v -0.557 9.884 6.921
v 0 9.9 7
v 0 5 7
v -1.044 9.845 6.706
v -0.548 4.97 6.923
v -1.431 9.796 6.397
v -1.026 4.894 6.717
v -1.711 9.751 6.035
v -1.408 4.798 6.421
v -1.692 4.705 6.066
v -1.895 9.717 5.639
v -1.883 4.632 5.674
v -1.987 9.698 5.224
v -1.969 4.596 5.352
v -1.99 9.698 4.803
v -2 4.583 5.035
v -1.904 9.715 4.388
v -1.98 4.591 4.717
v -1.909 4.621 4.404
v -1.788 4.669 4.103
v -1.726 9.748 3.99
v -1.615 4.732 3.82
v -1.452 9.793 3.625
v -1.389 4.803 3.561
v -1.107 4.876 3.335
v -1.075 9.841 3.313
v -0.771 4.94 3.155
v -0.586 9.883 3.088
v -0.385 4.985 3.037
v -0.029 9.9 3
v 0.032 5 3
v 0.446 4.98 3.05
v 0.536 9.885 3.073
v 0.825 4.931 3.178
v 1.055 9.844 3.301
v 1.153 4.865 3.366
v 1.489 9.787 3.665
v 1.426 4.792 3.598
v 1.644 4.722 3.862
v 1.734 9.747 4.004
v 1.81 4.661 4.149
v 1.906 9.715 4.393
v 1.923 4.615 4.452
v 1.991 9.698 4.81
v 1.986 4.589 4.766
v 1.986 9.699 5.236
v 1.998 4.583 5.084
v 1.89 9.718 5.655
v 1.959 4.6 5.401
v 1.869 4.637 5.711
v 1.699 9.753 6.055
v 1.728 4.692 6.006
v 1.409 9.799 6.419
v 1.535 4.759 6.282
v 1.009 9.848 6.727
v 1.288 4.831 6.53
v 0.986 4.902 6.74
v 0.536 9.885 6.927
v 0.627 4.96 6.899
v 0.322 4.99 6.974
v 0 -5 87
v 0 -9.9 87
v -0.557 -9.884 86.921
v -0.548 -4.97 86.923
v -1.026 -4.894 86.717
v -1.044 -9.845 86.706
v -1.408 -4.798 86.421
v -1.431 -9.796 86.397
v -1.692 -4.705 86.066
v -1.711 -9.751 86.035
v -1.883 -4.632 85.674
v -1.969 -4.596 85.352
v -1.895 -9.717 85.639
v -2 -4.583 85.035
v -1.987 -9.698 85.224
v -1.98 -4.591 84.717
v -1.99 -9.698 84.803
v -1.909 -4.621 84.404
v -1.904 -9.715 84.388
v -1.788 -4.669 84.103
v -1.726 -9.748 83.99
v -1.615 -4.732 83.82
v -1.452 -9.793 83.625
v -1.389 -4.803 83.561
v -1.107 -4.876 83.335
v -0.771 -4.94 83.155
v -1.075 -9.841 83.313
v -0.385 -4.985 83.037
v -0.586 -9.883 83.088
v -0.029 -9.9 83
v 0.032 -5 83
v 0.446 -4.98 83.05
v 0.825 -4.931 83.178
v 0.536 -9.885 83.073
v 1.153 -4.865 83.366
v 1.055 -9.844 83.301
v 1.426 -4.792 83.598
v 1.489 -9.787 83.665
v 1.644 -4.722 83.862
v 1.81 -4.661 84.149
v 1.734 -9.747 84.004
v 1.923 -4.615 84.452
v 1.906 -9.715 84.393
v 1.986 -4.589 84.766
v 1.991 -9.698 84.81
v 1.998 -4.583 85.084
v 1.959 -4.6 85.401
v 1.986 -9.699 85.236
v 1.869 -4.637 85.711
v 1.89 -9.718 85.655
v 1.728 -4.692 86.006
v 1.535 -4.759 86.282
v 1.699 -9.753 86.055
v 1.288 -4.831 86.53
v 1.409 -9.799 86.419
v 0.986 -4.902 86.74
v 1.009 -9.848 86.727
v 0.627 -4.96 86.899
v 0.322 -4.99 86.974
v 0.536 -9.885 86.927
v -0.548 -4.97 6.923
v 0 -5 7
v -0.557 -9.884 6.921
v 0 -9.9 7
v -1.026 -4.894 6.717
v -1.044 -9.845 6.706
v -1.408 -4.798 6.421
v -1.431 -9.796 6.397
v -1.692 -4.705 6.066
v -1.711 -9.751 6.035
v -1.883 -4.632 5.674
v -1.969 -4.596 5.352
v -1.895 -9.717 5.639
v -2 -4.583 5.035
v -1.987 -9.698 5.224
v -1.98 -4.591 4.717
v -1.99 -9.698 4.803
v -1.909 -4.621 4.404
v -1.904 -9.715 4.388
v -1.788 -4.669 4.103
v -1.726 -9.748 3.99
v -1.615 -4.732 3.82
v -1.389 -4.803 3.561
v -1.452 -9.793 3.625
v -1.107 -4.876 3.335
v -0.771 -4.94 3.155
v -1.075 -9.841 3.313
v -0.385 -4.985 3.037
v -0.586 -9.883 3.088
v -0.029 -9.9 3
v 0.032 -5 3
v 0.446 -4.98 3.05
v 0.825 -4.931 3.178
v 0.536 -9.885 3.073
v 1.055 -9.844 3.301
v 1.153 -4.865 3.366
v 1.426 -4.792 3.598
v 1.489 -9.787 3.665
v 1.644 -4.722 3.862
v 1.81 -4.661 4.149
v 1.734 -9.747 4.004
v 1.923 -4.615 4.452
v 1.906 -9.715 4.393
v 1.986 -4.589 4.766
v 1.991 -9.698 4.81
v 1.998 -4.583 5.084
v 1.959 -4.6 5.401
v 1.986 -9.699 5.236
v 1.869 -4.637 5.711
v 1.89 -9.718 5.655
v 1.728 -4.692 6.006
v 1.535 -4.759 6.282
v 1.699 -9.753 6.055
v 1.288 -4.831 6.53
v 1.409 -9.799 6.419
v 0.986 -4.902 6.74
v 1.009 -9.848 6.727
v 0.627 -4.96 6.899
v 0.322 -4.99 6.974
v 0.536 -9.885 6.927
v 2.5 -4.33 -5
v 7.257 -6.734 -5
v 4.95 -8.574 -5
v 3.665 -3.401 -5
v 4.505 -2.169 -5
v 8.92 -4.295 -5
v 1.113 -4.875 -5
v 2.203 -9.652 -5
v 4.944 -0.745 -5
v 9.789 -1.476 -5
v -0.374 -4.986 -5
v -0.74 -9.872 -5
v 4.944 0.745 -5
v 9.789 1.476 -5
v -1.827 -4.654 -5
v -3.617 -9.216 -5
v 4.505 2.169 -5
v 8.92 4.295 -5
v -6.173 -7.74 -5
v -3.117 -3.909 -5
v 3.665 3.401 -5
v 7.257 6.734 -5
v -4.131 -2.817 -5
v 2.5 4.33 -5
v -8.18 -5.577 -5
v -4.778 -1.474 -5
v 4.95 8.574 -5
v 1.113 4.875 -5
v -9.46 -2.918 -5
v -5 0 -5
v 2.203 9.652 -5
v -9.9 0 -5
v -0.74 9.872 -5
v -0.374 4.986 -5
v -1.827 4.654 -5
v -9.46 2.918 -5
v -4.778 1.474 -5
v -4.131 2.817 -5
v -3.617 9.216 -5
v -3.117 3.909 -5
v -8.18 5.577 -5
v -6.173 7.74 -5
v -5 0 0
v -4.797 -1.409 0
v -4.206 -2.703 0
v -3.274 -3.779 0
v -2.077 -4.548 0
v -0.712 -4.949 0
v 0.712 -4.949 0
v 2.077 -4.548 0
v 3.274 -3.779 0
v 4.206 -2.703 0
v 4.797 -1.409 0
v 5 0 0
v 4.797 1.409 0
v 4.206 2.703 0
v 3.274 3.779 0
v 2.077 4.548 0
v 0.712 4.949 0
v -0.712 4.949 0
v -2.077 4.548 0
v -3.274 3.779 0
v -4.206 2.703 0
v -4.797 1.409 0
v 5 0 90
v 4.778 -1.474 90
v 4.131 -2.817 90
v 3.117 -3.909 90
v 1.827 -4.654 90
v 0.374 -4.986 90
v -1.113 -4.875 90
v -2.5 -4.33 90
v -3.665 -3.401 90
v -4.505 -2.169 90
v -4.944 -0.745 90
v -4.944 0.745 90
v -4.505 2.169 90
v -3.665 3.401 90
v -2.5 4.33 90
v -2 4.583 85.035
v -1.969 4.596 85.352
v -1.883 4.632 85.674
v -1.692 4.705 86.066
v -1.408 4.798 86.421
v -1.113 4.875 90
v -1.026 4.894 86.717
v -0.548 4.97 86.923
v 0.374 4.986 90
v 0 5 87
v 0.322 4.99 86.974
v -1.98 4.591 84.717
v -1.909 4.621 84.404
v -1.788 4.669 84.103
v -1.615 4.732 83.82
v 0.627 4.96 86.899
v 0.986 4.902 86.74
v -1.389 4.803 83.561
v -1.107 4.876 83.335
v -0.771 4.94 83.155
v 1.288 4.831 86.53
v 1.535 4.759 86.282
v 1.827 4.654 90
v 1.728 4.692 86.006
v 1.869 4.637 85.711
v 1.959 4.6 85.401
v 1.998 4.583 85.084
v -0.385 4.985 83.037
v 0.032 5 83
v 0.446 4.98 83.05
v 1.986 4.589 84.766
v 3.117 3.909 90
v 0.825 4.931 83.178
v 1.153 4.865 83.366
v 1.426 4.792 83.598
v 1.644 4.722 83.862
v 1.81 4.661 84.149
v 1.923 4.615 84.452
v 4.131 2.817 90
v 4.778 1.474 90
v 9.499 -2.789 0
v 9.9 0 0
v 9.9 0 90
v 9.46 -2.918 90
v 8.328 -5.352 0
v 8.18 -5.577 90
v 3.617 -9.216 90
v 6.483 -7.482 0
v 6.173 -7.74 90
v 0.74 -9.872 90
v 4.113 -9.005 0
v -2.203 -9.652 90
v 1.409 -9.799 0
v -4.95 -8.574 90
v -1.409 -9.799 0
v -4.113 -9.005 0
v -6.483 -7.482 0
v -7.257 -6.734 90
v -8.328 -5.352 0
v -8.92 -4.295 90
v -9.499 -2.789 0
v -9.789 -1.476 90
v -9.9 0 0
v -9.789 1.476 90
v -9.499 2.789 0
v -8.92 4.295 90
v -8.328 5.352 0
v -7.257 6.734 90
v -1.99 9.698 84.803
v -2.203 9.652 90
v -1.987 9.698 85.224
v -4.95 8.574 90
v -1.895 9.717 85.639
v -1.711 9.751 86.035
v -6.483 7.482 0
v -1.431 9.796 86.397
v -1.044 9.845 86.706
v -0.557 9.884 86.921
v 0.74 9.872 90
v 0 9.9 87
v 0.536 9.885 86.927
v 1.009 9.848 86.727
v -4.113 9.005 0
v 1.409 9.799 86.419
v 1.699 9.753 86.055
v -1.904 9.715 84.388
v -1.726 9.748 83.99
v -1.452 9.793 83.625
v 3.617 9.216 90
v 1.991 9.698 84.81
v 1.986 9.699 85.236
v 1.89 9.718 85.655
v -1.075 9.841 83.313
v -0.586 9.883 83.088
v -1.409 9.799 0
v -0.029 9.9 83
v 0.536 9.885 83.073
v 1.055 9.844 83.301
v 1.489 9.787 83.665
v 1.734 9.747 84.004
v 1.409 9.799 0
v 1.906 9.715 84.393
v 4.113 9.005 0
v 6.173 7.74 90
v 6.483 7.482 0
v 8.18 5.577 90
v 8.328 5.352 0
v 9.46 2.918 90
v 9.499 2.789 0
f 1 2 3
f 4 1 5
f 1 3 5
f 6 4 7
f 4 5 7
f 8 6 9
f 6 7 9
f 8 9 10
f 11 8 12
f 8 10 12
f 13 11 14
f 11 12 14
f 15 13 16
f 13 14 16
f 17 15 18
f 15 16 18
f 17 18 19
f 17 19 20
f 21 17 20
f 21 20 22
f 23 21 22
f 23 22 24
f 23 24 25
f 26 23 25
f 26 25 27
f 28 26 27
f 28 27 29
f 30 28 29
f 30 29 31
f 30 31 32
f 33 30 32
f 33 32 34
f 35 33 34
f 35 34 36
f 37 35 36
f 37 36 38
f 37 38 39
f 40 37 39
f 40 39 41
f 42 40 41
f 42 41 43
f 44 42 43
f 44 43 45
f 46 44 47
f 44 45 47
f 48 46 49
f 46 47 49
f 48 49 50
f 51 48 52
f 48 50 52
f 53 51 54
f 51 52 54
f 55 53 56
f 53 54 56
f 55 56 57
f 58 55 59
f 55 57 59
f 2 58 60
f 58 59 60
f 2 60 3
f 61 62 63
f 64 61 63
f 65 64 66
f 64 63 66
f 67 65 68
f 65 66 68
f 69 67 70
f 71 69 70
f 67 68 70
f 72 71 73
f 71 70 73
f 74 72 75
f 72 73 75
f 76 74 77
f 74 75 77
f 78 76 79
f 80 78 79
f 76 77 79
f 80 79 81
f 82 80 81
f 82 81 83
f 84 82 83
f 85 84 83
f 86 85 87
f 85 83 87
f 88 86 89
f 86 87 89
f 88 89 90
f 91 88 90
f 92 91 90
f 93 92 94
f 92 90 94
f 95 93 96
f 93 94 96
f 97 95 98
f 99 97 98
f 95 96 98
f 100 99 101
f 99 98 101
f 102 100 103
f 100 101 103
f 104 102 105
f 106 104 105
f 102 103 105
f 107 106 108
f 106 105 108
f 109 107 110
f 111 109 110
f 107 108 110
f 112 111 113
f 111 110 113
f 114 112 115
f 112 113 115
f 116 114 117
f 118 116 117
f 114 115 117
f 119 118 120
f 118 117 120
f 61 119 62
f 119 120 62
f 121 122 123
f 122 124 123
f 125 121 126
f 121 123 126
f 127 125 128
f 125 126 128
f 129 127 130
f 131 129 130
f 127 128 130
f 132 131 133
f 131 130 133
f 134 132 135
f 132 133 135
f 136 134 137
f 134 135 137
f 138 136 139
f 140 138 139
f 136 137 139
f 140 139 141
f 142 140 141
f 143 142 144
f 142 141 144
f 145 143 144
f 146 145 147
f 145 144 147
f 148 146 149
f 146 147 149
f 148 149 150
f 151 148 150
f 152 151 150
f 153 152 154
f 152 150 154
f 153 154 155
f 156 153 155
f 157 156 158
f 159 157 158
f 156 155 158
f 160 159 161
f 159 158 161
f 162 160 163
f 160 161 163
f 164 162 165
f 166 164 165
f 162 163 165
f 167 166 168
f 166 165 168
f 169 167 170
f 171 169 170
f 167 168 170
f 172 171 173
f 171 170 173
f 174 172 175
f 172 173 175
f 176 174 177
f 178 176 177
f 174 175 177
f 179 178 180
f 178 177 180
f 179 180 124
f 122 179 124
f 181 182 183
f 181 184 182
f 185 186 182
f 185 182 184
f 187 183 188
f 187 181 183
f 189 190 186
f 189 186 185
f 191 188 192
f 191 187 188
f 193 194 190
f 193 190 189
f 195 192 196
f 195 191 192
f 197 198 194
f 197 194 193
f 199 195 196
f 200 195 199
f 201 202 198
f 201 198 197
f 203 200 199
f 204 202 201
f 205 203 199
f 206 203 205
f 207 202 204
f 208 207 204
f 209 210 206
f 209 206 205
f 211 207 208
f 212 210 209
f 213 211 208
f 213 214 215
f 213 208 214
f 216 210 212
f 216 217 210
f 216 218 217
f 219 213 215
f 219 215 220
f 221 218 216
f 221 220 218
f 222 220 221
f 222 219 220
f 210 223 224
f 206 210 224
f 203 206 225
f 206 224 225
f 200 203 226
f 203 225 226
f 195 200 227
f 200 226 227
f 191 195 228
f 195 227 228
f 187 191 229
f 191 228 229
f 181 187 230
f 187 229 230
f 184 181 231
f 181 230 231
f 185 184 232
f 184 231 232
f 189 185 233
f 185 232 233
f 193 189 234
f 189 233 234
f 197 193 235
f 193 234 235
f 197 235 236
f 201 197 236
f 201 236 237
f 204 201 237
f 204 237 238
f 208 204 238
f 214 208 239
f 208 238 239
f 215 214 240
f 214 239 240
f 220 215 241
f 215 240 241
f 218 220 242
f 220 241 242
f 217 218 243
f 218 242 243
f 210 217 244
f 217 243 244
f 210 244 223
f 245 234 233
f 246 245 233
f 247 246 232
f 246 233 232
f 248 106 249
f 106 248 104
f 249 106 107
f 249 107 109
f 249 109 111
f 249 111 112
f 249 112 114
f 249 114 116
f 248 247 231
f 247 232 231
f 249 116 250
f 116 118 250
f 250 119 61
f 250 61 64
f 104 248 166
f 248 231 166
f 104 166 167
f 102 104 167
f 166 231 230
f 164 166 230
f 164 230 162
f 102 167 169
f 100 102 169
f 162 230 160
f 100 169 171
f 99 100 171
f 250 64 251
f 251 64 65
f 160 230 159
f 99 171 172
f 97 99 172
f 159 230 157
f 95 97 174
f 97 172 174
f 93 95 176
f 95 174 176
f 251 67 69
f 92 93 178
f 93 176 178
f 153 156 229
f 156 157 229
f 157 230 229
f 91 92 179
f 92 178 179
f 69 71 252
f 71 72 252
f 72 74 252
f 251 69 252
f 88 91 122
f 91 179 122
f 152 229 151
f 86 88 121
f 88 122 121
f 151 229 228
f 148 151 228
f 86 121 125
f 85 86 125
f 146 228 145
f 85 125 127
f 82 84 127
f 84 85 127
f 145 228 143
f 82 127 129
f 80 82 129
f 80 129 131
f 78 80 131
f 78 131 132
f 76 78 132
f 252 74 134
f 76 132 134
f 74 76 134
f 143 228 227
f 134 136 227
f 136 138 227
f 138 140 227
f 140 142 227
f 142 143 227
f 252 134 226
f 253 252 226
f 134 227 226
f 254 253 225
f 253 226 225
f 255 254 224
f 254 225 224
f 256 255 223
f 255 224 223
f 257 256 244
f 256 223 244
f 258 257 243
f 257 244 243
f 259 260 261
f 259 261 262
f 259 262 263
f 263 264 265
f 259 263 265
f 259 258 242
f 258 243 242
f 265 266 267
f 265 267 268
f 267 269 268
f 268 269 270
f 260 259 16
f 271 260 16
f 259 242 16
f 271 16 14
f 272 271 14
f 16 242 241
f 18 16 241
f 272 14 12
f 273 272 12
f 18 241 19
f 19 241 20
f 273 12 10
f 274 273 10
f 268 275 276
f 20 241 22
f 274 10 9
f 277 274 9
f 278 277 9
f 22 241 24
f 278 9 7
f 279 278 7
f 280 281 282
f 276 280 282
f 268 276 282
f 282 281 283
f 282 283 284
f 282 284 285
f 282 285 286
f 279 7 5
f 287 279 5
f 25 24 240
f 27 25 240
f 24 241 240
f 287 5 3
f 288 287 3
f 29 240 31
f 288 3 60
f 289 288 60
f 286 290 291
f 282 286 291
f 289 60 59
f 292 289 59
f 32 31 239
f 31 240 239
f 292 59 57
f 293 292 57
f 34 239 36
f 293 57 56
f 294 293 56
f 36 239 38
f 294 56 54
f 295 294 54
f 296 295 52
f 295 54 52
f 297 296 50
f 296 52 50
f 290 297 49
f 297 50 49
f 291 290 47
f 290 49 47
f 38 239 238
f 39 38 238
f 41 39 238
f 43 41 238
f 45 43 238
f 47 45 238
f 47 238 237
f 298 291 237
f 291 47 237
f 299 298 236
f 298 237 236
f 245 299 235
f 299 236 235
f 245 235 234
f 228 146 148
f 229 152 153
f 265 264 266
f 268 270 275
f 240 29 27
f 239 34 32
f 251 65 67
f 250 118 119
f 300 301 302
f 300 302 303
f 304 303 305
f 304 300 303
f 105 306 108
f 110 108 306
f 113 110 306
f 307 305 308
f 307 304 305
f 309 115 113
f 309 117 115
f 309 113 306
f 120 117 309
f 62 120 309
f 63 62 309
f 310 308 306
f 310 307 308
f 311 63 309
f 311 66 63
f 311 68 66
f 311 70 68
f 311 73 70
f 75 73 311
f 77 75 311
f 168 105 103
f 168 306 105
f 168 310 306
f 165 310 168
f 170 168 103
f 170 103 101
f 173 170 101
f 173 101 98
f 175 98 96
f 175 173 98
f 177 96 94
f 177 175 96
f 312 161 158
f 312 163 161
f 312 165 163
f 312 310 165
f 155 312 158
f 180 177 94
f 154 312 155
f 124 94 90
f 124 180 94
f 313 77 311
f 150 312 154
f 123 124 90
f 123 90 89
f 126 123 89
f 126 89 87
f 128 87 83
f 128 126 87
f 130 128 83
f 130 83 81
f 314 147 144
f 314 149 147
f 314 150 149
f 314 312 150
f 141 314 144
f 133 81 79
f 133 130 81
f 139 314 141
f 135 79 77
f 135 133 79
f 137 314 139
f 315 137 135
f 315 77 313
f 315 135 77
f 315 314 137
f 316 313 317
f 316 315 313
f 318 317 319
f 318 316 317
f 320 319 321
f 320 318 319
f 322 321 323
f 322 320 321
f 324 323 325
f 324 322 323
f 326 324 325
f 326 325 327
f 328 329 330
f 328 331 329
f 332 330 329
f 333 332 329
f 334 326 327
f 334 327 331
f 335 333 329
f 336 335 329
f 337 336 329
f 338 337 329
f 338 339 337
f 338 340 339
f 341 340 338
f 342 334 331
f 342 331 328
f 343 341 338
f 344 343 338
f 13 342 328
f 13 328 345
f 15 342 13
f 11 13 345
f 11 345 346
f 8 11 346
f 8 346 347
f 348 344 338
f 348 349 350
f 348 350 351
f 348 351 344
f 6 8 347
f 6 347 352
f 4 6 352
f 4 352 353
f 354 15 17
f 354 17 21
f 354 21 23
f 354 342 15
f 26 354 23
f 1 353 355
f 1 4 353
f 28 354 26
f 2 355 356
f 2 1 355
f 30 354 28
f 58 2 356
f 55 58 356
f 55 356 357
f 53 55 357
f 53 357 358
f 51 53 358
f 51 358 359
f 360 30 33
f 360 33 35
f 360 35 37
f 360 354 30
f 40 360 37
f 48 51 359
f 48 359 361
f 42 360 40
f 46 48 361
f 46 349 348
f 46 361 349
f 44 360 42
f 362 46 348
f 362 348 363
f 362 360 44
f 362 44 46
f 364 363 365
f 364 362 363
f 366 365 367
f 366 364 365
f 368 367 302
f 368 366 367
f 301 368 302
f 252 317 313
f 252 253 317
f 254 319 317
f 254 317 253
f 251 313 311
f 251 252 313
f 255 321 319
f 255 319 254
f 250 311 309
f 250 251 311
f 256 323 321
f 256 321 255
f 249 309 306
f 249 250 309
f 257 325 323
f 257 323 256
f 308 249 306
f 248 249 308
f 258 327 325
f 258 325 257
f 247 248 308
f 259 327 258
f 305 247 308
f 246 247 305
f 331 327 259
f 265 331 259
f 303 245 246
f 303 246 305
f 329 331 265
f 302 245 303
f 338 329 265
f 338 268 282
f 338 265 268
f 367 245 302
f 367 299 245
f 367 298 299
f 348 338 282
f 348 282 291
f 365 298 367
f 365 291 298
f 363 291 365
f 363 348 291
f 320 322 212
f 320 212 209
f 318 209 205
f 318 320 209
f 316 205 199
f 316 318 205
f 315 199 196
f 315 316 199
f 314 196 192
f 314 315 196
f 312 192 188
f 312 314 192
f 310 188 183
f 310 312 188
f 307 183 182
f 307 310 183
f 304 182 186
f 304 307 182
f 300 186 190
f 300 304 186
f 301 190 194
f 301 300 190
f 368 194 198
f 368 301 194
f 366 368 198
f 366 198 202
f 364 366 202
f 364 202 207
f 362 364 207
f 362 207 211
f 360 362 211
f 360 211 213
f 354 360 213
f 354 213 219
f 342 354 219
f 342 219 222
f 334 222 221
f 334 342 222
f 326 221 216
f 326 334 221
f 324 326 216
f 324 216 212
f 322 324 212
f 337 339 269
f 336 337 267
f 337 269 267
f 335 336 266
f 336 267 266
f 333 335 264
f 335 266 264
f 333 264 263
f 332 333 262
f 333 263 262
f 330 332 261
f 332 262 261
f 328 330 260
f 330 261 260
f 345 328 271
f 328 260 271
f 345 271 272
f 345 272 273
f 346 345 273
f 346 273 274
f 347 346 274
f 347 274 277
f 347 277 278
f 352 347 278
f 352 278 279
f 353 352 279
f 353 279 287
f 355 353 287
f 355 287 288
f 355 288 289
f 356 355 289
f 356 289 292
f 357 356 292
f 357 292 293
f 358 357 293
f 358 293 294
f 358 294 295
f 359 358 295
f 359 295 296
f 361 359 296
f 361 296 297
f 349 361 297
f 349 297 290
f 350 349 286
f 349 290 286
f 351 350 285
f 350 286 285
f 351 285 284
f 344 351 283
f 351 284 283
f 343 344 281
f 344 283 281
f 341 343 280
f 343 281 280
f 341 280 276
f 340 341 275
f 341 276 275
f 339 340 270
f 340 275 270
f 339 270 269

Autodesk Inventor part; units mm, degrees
ref_plane "YZ Plane" through (0, 0, 0) normal (1, 0, 0) x (0, 1, 0)
ref_plane "XZ Plane" through (0, 0, 0) normal (0, 1, 0) x (-1, 0, 0)
ref_plane "XY Plane" through (0, 0, 0) normal (0, 0, 1) x (1, 0, 0)
sketch "Esquisse1" plane through (0, 0, 0) normal (0, 0, 1) x (1, 0, 0)
  circle A0 centre (0, 0) radius 9.9
  circle A1 centre (0, 0) radius 5
  dimension "d0" = 19.8
  dimension "d1" = 10
extrude "Extrusion1" add sketch "Esquisse1" along normal blind 90
sketch "Esquisse2" plane through (0, 0, 0) normal (0, 1, 0) x (-1, 0, 0)
  line L0 (0, 0) -> (0, 5)
  line L1 (9.9, 90) -> (-9.9, 90) projected
  line L2 (0, 90) -> (0, 85)
  dimension "d4" = 5
  dimension "d5" = 5
hole "Perçage1" at (0, 0, 5) at (0, 0, 85) direction (0, -1, 0) diameter 4 end through all both
sketch "Esquisse3" plane through (0, 0, 0) normal (0, 0, -1) x (-1, 0, 0)
  circle A0 centre (0, 0) radius 5 projected
  circle A1 centre (0, 0) radius 9.9 projected
extrude "Extrusion2" add sketch "Esquisse3" along normal blind 5
properties part number "tubelong_rocker"
